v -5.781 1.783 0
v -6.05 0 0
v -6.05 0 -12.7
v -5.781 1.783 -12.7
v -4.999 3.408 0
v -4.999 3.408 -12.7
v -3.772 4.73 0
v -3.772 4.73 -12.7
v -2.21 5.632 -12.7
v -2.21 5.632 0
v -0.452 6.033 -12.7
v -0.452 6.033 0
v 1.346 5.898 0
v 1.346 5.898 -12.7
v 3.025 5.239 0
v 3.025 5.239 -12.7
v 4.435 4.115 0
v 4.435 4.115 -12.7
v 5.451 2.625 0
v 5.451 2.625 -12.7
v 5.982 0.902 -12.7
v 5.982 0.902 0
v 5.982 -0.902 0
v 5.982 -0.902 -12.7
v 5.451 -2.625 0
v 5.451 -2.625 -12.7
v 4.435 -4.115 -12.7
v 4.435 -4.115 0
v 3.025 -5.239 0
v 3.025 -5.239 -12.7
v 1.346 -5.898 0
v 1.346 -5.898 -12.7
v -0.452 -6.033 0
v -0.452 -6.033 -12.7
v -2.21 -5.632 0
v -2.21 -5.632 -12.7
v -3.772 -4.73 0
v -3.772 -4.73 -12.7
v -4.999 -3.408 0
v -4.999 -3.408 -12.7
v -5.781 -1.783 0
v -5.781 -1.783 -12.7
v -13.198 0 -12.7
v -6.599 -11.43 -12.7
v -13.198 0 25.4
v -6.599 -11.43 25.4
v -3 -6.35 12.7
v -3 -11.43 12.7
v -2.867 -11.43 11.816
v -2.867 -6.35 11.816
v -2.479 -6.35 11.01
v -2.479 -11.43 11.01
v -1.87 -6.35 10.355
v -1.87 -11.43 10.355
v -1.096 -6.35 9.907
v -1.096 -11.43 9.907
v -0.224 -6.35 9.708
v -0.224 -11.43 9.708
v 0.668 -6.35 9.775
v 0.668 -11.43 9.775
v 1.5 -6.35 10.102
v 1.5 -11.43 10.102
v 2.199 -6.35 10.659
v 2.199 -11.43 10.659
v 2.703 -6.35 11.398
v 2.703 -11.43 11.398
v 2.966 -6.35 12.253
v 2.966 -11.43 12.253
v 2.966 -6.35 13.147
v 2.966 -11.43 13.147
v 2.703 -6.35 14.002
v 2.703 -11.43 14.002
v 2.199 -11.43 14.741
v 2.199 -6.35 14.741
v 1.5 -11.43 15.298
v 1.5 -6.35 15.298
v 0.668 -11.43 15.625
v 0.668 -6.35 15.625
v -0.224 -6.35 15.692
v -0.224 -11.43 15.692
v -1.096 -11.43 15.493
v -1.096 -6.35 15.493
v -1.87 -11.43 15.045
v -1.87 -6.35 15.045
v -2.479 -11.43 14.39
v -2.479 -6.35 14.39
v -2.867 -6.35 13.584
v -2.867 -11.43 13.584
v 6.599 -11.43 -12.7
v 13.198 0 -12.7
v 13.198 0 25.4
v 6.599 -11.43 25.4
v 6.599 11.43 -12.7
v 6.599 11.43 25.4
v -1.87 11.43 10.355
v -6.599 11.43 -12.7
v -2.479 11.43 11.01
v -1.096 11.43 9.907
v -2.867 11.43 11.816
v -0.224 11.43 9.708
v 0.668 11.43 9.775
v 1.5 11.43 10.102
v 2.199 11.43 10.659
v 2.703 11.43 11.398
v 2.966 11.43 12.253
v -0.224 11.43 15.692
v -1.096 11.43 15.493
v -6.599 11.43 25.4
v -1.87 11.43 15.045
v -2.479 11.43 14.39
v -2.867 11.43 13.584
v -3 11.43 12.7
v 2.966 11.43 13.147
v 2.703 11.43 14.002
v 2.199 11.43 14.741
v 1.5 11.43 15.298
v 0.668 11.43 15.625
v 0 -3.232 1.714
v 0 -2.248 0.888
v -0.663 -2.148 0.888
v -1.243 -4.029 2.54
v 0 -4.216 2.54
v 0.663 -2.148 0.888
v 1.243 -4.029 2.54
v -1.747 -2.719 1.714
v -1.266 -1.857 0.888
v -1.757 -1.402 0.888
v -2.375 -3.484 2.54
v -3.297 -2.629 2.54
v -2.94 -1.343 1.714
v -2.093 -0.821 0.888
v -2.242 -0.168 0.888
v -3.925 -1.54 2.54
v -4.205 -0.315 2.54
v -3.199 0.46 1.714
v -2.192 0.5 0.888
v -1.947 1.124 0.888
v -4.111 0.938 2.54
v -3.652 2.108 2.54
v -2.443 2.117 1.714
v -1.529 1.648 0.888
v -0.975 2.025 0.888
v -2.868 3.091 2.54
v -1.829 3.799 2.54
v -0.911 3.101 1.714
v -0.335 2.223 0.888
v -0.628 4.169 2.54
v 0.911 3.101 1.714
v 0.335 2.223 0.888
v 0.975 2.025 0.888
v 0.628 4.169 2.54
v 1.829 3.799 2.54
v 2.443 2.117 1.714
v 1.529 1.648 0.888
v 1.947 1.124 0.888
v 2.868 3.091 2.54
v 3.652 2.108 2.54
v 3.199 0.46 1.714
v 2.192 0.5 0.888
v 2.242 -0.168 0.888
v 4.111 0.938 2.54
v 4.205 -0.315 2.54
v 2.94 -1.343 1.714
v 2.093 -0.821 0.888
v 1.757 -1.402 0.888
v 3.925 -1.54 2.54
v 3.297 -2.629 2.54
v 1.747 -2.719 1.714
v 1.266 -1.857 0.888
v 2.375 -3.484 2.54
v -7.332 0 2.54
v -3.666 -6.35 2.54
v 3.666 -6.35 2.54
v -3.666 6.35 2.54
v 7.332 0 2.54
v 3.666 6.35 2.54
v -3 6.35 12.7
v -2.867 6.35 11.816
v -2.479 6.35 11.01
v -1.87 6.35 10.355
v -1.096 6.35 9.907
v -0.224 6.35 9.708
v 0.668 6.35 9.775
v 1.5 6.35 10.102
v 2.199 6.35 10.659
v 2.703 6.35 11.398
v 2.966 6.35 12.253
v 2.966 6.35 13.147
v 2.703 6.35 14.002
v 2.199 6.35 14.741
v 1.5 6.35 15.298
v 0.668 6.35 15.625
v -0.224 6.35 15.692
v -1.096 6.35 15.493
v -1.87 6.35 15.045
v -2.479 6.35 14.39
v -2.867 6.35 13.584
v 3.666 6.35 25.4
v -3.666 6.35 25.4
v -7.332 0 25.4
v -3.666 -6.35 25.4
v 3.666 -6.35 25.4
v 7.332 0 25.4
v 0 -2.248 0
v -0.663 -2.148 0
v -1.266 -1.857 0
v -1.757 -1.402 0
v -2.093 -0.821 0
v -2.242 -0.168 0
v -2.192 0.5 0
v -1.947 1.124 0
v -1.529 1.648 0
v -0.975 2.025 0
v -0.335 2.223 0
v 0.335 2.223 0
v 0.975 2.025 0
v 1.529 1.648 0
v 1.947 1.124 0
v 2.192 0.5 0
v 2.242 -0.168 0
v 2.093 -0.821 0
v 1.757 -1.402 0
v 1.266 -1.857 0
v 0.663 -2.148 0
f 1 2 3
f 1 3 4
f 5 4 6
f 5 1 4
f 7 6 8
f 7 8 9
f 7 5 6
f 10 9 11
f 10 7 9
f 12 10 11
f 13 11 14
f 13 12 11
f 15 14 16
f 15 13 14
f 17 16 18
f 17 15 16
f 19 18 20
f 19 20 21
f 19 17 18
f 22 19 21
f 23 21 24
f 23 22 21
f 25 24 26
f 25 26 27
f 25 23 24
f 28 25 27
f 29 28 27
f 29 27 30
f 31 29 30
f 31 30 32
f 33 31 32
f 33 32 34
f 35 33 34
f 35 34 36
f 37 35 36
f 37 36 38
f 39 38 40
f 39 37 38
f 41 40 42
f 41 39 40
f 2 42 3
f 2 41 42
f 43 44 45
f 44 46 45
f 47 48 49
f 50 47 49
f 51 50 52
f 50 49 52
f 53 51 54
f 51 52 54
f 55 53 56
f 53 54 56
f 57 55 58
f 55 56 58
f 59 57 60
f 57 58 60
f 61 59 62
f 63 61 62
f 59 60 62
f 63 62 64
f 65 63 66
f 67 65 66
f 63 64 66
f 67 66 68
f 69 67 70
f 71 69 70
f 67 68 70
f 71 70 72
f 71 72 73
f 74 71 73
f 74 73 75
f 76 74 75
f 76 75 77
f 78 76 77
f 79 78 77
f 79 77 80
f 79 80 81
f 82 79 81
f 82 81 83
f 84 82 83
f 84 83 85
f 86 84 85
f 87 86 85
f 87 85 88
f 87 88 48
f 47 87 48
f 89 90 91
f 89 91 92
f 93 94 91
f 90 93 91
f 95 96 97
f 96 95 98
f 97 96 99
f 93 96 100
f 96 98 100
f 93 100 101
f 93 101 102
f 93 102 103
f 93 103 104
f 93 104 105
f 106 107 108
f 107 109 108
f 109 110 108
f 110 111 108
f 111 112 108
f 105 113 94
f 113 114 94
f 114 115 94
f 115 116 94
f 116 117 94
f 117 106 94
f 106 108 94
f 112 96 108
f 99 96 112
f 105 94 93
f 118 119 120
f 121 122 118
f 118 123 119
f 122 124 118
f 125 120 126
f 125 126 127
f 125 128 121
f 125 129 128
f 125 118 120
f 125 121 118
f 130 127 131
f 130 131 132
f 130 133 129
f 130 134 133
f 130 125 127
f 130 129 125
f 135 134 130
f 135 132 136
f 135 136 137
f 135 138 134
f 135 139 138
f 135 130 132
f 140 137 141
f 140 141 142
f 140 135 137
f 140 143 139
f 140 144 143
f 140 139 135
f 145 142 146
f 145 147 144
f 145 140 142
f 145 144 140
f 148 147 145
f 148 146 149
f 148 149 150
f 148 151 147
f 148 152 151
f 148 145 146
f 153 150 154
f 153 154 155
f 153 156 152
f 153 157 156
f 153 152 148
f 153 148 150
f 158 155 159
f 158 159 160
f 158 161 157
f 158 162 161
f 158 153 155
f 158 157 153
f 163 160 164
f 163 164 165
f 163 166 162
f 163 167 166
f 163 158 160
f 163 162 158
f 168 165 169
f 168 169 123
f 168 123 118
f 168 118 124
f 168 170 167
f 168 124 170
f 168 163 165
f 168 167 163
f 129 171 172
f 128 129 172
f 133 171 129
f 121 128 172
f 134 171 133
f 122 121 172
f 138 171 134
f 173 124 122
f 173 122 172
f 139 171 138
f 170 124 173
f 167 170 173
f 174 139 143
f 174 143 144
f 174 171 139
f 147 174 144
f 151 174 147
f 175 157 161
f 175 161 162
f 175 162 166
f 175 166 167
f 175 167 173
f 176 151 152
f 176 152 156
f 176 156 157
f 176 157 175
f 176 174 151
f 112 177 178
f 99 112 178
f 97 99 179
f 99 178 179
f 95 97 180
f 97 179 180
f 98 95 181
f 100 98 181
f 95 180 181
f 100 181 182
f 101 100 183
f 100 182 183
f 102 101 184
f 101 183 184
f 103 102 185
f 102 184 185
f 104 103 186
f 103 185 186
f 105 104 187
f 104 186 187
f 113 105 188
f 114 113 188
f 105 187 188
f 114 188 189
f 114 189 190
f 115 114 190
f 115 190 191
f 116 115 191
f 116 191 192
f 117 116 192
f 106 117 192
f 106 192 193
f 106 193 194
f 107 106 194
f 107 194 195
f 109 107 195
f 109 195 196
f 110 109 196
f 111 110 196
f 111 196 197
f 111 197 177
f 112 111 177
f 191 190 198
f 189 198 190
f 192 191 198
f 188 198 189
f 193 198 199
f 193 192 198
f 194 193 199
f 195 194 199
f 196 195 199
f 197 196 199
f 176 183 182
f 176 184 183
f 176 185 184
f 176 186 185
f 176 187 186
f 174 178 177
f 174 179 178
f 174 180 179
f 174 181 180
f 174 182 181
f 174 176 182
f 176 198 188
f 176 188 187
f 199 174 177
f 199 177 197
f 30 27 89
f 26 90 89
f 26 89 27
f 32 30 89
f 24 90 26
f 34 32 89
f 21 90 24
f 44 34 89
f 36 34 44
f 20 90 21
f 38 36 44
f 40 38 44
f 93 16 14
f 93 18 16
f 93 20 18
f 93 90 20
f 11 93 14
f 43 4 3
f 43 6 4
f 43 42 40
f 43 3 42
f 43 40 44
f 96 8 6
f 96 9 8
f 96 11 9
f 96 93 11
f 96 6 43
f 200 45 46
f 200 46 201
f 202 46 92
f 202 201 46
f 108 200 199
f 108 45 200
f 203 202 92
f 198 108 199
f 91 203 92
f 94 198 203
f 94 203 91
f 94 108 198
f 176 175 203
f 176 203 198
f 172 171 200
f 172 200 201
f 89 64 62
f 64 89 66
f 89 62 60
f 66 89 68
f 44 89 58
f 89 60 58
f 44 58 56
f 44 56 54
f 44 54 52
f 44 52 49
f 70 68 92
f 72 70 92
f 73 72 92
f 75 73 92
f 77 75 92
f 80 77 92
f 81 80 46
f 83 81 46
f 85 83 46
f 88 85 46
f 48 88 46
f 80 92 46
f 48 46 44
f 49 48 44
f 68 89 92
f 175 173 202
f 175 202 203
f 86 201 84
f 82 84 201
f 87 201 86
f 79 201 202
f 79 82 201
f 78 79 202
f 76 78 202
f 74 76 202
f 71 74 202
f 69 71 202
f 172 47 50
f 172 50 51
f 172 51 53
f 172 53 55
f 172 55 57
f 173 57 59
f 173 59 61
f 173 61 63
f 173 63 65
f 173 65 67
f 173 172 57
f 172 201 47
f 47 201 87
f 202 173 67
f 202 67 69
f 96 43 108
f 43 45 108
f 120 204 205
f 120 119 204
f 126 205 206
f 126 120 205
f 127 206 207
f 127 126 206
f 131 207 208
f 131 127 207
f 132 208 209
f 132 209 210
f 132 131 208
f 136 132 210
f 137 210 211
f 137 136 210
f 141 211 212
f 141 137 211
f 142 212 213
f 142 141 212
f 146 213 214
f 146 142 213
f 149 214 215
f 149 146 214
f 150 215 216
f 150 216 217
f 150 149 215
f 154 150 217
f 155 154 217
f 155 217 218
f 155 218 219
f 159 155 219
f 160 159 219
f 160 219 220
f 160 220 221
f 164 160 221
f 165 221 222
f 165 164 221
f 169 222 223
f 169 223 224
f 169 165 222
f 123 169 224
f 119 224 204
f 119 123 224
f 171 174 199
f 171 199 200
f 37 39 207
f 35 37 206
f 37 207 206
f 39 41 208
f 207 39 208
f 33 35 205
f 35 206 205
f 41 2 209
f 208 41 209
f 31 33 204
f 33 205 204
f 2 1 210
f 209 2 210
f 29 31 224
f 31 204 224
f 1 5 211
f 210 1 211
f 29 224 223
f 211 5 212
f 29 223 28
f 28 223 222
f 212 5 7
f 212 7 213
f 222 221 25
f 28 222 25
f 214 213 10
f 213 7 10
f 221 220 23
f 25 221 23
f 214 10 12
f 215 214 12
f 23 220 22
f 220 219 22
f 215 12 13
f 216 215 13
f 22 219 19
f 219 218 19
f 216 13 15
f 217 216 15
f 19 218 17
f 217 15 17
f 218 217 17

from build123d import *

# Parameters (mm, degrees)
BOSS_EXTRUDE1_DEPTH                       = 2.54
CSK_FOR_8_FLAT_HEAD_MACHINE_SCREW_2_COUNT = 2
CSK_FOR_8_FLAT_HEAD_MACHINE_SCREW_2_PITCH = 18.548356757
BOSS_EXTRUDE2_DEPTH                       = 25.4
M7X1_0_TAPPED_HOLE1_D                     = 6
SKETCH6_R                                 = 6.05
BOSS_EXTRUDE3_DEPTH                       = 12.7


with BuildPart() as part:
    # Sketch1 → Boss-Extrude1 (new body)
    with BuildSketch(Plane.XY):
        Polygon((13.198227154, 0), (6.599113577, 11.43), (-6.599113577, 11.43), (-13.198227154, 0), (-6.599113577, -11.43), (6.599113577, -11.43), align=None)
    extrude(amount=BOSS_EXTRUDE1_DEPTH)

    # Sketch3 → CSK for #8 Flat Head Machine Screw (100)1 (revolve, cut)
    with BuildSketch(Plane(origin=(0, 0, 2.54), x_dir=(0, -1, 0), z_dir=(1, 0, 0))):
        Polygon((0, 0), (0, 2.54), (2.2479, 2.54), (2.2479, 1.651767624), (4.2164, 0), align=None)
    csk_for_8_flat_head_machine_screw_100 = revolve(axis=Axis((0, 0, 8.89), (0, 0, -1)), mode=Mode.SUBTRACT)

    # CSK for _8 Flat Head Machine Screw _ 2: CSK for #8 Flat Head Machine Screw (100)1 ×2
    with Locations(*[Vector(-0.9274068813992224, 0.37405410883101997, 0) * (i * CSK_FOR_8_FLAT_HEAD_MACHINE_SCREW_2_PITCH) for i in range(1, CSK_FOR_8_FLAT_HEAD_MACHINE_SCREW_2_COUNT)]):
        add(csk_for_8_flat_head_machine_screw_100, mode=Mode.SUBTRACT)

    # Sketch1<4> → Boss-Extrude2 (add)
    with BuildSketch(Plane.XY):
        Polygon((6.599113577, 11.43), (-6.599113577, 11.43), (-13.198227154, 0), (-6.599113577, -11.43), (6.599113577, -11.43), (13.198227154, 0), align=None)
        Polygon((3.666174209, -6.35), (7.332348419, 0), (3.666174209, 6.35), (-3.666174209, 6.35), (-7.332348419, 0), (-3.666174209, -6.35), align=None, mode=Mode.SUBTRACT)
    extrude(amount=BOSS_EXTRUDE2_DEPTH)

    # M7x1.0 Tapped Hole1 (through all)
    with Locations(Plane(origin=(0, 11.43, 0), x_dir=(1, 0, 0), z_dir=(0, 1, 0))):
        with Locations((0, -12.7)):
            Hole(M7X1_0_TAPPED_HOLE1_D / 2)

    # Sketch6 → Boss-Extrude3 (add)
    with BuildSketch(Plane(origin=(0, 0, 0), x_dir=(-1, 0, 0), z_dir=(0, 0, -1))):
        Polygon((-13.198227154, 0), (-6.599113577, -11.43), (6.599113577, -11.43), (13.198227154, 0), (6.599113577, 11.43), (-6.599113577, 11.43), align=None)
        Circle(SKETCH6_R, mode=Mode.SUBTRACT)
    extrude(amount=BOSS_EXTRUDE3_DEPTH)


solid = part.part
